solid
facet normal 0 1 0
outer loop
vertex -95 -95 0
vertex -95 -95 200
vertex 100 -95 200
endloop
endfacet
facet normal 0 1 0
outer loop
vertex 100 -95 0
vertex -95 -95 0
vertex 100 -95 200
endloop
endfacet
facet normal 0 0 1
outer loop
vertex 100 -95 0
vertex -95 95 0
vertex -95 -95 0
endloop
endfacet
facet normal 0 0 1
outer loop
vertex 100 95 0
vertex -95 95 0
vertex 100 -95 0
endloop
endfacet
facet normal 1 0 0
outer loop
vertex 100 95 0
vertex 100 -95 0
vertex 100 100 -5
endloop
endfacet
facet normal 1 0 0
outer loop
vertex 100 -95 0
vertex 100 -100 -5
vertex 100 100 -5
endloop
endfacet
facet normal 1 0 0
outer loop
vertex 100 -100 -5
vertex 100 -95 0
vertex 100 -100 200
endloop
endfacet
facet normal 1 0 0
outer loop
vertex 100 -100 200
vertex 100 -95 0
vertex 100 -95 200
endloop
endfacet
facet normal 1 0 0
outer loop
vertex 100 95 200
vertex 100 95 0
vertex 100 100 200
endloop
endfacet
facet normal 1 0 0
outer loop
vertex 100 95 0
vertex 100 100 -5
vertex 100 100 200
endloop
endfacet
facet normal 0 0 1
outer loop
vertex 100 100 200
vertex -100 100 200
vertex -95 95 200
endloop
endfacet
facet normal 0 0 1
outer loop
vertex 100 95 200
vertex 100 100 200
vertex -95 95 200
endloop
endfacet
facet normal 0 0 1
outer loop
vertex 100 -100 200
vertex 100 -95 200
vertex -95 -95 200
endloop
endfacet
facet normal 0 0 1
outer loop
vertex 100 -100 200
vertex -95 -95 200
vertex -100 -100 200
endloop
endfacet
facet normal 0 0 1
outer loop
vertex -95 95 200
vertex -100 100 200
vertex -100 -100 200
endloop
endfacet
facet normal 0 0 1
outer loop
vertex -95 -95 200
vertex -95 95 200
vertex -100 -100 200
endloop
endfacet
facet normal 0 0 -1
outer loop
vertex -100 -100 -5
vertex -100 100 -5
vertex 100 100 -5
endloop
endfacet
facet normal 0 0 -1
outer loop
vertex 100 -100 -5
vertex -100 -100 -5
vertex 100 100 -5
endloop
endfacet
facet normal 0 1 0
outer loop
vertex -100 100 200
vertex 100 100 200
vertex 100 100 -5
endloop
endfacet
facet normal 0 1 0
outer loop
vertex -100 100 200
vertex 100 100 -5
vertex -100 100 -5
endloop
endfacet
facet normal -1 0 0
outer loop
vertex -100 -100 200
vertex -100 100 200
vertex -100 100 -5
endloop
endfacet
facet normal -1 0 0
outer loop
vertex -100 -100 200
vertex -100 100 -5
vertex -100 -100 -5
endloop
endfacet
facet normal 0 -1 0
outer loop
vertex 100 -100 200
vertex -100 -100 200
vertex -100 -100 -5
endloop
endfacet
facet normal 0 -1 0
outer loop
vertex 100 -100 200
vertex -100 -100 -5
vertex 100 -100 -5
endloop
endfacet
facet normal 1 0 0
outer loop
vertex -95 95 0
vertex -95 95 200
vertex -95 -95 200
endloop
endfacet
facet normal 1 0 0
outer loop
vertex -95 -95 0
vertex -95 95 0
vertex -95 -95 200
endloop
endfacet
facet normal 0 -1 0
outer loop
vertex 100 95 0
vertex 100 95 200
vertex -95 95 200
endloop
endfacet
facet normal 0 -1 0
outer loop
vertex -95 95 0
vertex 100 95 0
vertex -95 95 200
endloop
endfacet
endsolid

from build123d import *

# Parameters (mm, degrees)
F0_W     = 200
F0_H     = 200
F5_DEPTH = 5
F1_W     = 200
F1_H     = 200
F6_DEPTH = 5
F2_W     = 200
F2_H     = 200
F3_DEPTH = 5
F4_W     = 190
F4_H     = 200
F7_DEPTH = 5


with BuildPart() as f5:
    # F0 (on Top) → F5 (new body)
    with BuildSketch(Plane.XY):
        Rectangle(F0_W, F0_H)
    extrude(amount=-F5_DEPTH)

    # F1 (on face) → F6 (join)
    with BuildSketch(Plane.XZ.offset(100)):
        with Locations((0, 100)):
            Rectangle(F1_W, F1_H)
    extrude(amount=-F6_DEPTH)

    # F2 (on face) → F3 (join)
    with BuildSketch(Plane(origin=(0, 100, 0), x_dir=(-1, 0, 0), z_dir=(0, 1, 0))):
        with Locations((0, 100)):
            Rectangle(F2_W, F2_H)
    extrude(amount=-F3_DEPTH)

    # F4 (on face) → F7 (join)
    with BuildSketch(Plane(origin=(-100, 0, 0), x_dir=(0, -1, 0), z_dir=(-1, 0, 0))):
        with Locations((0, 100)):
            Rectangle(F4_W, F4_H)
    extrude(amount=-F7_DEPTH)


solid = f5.part
